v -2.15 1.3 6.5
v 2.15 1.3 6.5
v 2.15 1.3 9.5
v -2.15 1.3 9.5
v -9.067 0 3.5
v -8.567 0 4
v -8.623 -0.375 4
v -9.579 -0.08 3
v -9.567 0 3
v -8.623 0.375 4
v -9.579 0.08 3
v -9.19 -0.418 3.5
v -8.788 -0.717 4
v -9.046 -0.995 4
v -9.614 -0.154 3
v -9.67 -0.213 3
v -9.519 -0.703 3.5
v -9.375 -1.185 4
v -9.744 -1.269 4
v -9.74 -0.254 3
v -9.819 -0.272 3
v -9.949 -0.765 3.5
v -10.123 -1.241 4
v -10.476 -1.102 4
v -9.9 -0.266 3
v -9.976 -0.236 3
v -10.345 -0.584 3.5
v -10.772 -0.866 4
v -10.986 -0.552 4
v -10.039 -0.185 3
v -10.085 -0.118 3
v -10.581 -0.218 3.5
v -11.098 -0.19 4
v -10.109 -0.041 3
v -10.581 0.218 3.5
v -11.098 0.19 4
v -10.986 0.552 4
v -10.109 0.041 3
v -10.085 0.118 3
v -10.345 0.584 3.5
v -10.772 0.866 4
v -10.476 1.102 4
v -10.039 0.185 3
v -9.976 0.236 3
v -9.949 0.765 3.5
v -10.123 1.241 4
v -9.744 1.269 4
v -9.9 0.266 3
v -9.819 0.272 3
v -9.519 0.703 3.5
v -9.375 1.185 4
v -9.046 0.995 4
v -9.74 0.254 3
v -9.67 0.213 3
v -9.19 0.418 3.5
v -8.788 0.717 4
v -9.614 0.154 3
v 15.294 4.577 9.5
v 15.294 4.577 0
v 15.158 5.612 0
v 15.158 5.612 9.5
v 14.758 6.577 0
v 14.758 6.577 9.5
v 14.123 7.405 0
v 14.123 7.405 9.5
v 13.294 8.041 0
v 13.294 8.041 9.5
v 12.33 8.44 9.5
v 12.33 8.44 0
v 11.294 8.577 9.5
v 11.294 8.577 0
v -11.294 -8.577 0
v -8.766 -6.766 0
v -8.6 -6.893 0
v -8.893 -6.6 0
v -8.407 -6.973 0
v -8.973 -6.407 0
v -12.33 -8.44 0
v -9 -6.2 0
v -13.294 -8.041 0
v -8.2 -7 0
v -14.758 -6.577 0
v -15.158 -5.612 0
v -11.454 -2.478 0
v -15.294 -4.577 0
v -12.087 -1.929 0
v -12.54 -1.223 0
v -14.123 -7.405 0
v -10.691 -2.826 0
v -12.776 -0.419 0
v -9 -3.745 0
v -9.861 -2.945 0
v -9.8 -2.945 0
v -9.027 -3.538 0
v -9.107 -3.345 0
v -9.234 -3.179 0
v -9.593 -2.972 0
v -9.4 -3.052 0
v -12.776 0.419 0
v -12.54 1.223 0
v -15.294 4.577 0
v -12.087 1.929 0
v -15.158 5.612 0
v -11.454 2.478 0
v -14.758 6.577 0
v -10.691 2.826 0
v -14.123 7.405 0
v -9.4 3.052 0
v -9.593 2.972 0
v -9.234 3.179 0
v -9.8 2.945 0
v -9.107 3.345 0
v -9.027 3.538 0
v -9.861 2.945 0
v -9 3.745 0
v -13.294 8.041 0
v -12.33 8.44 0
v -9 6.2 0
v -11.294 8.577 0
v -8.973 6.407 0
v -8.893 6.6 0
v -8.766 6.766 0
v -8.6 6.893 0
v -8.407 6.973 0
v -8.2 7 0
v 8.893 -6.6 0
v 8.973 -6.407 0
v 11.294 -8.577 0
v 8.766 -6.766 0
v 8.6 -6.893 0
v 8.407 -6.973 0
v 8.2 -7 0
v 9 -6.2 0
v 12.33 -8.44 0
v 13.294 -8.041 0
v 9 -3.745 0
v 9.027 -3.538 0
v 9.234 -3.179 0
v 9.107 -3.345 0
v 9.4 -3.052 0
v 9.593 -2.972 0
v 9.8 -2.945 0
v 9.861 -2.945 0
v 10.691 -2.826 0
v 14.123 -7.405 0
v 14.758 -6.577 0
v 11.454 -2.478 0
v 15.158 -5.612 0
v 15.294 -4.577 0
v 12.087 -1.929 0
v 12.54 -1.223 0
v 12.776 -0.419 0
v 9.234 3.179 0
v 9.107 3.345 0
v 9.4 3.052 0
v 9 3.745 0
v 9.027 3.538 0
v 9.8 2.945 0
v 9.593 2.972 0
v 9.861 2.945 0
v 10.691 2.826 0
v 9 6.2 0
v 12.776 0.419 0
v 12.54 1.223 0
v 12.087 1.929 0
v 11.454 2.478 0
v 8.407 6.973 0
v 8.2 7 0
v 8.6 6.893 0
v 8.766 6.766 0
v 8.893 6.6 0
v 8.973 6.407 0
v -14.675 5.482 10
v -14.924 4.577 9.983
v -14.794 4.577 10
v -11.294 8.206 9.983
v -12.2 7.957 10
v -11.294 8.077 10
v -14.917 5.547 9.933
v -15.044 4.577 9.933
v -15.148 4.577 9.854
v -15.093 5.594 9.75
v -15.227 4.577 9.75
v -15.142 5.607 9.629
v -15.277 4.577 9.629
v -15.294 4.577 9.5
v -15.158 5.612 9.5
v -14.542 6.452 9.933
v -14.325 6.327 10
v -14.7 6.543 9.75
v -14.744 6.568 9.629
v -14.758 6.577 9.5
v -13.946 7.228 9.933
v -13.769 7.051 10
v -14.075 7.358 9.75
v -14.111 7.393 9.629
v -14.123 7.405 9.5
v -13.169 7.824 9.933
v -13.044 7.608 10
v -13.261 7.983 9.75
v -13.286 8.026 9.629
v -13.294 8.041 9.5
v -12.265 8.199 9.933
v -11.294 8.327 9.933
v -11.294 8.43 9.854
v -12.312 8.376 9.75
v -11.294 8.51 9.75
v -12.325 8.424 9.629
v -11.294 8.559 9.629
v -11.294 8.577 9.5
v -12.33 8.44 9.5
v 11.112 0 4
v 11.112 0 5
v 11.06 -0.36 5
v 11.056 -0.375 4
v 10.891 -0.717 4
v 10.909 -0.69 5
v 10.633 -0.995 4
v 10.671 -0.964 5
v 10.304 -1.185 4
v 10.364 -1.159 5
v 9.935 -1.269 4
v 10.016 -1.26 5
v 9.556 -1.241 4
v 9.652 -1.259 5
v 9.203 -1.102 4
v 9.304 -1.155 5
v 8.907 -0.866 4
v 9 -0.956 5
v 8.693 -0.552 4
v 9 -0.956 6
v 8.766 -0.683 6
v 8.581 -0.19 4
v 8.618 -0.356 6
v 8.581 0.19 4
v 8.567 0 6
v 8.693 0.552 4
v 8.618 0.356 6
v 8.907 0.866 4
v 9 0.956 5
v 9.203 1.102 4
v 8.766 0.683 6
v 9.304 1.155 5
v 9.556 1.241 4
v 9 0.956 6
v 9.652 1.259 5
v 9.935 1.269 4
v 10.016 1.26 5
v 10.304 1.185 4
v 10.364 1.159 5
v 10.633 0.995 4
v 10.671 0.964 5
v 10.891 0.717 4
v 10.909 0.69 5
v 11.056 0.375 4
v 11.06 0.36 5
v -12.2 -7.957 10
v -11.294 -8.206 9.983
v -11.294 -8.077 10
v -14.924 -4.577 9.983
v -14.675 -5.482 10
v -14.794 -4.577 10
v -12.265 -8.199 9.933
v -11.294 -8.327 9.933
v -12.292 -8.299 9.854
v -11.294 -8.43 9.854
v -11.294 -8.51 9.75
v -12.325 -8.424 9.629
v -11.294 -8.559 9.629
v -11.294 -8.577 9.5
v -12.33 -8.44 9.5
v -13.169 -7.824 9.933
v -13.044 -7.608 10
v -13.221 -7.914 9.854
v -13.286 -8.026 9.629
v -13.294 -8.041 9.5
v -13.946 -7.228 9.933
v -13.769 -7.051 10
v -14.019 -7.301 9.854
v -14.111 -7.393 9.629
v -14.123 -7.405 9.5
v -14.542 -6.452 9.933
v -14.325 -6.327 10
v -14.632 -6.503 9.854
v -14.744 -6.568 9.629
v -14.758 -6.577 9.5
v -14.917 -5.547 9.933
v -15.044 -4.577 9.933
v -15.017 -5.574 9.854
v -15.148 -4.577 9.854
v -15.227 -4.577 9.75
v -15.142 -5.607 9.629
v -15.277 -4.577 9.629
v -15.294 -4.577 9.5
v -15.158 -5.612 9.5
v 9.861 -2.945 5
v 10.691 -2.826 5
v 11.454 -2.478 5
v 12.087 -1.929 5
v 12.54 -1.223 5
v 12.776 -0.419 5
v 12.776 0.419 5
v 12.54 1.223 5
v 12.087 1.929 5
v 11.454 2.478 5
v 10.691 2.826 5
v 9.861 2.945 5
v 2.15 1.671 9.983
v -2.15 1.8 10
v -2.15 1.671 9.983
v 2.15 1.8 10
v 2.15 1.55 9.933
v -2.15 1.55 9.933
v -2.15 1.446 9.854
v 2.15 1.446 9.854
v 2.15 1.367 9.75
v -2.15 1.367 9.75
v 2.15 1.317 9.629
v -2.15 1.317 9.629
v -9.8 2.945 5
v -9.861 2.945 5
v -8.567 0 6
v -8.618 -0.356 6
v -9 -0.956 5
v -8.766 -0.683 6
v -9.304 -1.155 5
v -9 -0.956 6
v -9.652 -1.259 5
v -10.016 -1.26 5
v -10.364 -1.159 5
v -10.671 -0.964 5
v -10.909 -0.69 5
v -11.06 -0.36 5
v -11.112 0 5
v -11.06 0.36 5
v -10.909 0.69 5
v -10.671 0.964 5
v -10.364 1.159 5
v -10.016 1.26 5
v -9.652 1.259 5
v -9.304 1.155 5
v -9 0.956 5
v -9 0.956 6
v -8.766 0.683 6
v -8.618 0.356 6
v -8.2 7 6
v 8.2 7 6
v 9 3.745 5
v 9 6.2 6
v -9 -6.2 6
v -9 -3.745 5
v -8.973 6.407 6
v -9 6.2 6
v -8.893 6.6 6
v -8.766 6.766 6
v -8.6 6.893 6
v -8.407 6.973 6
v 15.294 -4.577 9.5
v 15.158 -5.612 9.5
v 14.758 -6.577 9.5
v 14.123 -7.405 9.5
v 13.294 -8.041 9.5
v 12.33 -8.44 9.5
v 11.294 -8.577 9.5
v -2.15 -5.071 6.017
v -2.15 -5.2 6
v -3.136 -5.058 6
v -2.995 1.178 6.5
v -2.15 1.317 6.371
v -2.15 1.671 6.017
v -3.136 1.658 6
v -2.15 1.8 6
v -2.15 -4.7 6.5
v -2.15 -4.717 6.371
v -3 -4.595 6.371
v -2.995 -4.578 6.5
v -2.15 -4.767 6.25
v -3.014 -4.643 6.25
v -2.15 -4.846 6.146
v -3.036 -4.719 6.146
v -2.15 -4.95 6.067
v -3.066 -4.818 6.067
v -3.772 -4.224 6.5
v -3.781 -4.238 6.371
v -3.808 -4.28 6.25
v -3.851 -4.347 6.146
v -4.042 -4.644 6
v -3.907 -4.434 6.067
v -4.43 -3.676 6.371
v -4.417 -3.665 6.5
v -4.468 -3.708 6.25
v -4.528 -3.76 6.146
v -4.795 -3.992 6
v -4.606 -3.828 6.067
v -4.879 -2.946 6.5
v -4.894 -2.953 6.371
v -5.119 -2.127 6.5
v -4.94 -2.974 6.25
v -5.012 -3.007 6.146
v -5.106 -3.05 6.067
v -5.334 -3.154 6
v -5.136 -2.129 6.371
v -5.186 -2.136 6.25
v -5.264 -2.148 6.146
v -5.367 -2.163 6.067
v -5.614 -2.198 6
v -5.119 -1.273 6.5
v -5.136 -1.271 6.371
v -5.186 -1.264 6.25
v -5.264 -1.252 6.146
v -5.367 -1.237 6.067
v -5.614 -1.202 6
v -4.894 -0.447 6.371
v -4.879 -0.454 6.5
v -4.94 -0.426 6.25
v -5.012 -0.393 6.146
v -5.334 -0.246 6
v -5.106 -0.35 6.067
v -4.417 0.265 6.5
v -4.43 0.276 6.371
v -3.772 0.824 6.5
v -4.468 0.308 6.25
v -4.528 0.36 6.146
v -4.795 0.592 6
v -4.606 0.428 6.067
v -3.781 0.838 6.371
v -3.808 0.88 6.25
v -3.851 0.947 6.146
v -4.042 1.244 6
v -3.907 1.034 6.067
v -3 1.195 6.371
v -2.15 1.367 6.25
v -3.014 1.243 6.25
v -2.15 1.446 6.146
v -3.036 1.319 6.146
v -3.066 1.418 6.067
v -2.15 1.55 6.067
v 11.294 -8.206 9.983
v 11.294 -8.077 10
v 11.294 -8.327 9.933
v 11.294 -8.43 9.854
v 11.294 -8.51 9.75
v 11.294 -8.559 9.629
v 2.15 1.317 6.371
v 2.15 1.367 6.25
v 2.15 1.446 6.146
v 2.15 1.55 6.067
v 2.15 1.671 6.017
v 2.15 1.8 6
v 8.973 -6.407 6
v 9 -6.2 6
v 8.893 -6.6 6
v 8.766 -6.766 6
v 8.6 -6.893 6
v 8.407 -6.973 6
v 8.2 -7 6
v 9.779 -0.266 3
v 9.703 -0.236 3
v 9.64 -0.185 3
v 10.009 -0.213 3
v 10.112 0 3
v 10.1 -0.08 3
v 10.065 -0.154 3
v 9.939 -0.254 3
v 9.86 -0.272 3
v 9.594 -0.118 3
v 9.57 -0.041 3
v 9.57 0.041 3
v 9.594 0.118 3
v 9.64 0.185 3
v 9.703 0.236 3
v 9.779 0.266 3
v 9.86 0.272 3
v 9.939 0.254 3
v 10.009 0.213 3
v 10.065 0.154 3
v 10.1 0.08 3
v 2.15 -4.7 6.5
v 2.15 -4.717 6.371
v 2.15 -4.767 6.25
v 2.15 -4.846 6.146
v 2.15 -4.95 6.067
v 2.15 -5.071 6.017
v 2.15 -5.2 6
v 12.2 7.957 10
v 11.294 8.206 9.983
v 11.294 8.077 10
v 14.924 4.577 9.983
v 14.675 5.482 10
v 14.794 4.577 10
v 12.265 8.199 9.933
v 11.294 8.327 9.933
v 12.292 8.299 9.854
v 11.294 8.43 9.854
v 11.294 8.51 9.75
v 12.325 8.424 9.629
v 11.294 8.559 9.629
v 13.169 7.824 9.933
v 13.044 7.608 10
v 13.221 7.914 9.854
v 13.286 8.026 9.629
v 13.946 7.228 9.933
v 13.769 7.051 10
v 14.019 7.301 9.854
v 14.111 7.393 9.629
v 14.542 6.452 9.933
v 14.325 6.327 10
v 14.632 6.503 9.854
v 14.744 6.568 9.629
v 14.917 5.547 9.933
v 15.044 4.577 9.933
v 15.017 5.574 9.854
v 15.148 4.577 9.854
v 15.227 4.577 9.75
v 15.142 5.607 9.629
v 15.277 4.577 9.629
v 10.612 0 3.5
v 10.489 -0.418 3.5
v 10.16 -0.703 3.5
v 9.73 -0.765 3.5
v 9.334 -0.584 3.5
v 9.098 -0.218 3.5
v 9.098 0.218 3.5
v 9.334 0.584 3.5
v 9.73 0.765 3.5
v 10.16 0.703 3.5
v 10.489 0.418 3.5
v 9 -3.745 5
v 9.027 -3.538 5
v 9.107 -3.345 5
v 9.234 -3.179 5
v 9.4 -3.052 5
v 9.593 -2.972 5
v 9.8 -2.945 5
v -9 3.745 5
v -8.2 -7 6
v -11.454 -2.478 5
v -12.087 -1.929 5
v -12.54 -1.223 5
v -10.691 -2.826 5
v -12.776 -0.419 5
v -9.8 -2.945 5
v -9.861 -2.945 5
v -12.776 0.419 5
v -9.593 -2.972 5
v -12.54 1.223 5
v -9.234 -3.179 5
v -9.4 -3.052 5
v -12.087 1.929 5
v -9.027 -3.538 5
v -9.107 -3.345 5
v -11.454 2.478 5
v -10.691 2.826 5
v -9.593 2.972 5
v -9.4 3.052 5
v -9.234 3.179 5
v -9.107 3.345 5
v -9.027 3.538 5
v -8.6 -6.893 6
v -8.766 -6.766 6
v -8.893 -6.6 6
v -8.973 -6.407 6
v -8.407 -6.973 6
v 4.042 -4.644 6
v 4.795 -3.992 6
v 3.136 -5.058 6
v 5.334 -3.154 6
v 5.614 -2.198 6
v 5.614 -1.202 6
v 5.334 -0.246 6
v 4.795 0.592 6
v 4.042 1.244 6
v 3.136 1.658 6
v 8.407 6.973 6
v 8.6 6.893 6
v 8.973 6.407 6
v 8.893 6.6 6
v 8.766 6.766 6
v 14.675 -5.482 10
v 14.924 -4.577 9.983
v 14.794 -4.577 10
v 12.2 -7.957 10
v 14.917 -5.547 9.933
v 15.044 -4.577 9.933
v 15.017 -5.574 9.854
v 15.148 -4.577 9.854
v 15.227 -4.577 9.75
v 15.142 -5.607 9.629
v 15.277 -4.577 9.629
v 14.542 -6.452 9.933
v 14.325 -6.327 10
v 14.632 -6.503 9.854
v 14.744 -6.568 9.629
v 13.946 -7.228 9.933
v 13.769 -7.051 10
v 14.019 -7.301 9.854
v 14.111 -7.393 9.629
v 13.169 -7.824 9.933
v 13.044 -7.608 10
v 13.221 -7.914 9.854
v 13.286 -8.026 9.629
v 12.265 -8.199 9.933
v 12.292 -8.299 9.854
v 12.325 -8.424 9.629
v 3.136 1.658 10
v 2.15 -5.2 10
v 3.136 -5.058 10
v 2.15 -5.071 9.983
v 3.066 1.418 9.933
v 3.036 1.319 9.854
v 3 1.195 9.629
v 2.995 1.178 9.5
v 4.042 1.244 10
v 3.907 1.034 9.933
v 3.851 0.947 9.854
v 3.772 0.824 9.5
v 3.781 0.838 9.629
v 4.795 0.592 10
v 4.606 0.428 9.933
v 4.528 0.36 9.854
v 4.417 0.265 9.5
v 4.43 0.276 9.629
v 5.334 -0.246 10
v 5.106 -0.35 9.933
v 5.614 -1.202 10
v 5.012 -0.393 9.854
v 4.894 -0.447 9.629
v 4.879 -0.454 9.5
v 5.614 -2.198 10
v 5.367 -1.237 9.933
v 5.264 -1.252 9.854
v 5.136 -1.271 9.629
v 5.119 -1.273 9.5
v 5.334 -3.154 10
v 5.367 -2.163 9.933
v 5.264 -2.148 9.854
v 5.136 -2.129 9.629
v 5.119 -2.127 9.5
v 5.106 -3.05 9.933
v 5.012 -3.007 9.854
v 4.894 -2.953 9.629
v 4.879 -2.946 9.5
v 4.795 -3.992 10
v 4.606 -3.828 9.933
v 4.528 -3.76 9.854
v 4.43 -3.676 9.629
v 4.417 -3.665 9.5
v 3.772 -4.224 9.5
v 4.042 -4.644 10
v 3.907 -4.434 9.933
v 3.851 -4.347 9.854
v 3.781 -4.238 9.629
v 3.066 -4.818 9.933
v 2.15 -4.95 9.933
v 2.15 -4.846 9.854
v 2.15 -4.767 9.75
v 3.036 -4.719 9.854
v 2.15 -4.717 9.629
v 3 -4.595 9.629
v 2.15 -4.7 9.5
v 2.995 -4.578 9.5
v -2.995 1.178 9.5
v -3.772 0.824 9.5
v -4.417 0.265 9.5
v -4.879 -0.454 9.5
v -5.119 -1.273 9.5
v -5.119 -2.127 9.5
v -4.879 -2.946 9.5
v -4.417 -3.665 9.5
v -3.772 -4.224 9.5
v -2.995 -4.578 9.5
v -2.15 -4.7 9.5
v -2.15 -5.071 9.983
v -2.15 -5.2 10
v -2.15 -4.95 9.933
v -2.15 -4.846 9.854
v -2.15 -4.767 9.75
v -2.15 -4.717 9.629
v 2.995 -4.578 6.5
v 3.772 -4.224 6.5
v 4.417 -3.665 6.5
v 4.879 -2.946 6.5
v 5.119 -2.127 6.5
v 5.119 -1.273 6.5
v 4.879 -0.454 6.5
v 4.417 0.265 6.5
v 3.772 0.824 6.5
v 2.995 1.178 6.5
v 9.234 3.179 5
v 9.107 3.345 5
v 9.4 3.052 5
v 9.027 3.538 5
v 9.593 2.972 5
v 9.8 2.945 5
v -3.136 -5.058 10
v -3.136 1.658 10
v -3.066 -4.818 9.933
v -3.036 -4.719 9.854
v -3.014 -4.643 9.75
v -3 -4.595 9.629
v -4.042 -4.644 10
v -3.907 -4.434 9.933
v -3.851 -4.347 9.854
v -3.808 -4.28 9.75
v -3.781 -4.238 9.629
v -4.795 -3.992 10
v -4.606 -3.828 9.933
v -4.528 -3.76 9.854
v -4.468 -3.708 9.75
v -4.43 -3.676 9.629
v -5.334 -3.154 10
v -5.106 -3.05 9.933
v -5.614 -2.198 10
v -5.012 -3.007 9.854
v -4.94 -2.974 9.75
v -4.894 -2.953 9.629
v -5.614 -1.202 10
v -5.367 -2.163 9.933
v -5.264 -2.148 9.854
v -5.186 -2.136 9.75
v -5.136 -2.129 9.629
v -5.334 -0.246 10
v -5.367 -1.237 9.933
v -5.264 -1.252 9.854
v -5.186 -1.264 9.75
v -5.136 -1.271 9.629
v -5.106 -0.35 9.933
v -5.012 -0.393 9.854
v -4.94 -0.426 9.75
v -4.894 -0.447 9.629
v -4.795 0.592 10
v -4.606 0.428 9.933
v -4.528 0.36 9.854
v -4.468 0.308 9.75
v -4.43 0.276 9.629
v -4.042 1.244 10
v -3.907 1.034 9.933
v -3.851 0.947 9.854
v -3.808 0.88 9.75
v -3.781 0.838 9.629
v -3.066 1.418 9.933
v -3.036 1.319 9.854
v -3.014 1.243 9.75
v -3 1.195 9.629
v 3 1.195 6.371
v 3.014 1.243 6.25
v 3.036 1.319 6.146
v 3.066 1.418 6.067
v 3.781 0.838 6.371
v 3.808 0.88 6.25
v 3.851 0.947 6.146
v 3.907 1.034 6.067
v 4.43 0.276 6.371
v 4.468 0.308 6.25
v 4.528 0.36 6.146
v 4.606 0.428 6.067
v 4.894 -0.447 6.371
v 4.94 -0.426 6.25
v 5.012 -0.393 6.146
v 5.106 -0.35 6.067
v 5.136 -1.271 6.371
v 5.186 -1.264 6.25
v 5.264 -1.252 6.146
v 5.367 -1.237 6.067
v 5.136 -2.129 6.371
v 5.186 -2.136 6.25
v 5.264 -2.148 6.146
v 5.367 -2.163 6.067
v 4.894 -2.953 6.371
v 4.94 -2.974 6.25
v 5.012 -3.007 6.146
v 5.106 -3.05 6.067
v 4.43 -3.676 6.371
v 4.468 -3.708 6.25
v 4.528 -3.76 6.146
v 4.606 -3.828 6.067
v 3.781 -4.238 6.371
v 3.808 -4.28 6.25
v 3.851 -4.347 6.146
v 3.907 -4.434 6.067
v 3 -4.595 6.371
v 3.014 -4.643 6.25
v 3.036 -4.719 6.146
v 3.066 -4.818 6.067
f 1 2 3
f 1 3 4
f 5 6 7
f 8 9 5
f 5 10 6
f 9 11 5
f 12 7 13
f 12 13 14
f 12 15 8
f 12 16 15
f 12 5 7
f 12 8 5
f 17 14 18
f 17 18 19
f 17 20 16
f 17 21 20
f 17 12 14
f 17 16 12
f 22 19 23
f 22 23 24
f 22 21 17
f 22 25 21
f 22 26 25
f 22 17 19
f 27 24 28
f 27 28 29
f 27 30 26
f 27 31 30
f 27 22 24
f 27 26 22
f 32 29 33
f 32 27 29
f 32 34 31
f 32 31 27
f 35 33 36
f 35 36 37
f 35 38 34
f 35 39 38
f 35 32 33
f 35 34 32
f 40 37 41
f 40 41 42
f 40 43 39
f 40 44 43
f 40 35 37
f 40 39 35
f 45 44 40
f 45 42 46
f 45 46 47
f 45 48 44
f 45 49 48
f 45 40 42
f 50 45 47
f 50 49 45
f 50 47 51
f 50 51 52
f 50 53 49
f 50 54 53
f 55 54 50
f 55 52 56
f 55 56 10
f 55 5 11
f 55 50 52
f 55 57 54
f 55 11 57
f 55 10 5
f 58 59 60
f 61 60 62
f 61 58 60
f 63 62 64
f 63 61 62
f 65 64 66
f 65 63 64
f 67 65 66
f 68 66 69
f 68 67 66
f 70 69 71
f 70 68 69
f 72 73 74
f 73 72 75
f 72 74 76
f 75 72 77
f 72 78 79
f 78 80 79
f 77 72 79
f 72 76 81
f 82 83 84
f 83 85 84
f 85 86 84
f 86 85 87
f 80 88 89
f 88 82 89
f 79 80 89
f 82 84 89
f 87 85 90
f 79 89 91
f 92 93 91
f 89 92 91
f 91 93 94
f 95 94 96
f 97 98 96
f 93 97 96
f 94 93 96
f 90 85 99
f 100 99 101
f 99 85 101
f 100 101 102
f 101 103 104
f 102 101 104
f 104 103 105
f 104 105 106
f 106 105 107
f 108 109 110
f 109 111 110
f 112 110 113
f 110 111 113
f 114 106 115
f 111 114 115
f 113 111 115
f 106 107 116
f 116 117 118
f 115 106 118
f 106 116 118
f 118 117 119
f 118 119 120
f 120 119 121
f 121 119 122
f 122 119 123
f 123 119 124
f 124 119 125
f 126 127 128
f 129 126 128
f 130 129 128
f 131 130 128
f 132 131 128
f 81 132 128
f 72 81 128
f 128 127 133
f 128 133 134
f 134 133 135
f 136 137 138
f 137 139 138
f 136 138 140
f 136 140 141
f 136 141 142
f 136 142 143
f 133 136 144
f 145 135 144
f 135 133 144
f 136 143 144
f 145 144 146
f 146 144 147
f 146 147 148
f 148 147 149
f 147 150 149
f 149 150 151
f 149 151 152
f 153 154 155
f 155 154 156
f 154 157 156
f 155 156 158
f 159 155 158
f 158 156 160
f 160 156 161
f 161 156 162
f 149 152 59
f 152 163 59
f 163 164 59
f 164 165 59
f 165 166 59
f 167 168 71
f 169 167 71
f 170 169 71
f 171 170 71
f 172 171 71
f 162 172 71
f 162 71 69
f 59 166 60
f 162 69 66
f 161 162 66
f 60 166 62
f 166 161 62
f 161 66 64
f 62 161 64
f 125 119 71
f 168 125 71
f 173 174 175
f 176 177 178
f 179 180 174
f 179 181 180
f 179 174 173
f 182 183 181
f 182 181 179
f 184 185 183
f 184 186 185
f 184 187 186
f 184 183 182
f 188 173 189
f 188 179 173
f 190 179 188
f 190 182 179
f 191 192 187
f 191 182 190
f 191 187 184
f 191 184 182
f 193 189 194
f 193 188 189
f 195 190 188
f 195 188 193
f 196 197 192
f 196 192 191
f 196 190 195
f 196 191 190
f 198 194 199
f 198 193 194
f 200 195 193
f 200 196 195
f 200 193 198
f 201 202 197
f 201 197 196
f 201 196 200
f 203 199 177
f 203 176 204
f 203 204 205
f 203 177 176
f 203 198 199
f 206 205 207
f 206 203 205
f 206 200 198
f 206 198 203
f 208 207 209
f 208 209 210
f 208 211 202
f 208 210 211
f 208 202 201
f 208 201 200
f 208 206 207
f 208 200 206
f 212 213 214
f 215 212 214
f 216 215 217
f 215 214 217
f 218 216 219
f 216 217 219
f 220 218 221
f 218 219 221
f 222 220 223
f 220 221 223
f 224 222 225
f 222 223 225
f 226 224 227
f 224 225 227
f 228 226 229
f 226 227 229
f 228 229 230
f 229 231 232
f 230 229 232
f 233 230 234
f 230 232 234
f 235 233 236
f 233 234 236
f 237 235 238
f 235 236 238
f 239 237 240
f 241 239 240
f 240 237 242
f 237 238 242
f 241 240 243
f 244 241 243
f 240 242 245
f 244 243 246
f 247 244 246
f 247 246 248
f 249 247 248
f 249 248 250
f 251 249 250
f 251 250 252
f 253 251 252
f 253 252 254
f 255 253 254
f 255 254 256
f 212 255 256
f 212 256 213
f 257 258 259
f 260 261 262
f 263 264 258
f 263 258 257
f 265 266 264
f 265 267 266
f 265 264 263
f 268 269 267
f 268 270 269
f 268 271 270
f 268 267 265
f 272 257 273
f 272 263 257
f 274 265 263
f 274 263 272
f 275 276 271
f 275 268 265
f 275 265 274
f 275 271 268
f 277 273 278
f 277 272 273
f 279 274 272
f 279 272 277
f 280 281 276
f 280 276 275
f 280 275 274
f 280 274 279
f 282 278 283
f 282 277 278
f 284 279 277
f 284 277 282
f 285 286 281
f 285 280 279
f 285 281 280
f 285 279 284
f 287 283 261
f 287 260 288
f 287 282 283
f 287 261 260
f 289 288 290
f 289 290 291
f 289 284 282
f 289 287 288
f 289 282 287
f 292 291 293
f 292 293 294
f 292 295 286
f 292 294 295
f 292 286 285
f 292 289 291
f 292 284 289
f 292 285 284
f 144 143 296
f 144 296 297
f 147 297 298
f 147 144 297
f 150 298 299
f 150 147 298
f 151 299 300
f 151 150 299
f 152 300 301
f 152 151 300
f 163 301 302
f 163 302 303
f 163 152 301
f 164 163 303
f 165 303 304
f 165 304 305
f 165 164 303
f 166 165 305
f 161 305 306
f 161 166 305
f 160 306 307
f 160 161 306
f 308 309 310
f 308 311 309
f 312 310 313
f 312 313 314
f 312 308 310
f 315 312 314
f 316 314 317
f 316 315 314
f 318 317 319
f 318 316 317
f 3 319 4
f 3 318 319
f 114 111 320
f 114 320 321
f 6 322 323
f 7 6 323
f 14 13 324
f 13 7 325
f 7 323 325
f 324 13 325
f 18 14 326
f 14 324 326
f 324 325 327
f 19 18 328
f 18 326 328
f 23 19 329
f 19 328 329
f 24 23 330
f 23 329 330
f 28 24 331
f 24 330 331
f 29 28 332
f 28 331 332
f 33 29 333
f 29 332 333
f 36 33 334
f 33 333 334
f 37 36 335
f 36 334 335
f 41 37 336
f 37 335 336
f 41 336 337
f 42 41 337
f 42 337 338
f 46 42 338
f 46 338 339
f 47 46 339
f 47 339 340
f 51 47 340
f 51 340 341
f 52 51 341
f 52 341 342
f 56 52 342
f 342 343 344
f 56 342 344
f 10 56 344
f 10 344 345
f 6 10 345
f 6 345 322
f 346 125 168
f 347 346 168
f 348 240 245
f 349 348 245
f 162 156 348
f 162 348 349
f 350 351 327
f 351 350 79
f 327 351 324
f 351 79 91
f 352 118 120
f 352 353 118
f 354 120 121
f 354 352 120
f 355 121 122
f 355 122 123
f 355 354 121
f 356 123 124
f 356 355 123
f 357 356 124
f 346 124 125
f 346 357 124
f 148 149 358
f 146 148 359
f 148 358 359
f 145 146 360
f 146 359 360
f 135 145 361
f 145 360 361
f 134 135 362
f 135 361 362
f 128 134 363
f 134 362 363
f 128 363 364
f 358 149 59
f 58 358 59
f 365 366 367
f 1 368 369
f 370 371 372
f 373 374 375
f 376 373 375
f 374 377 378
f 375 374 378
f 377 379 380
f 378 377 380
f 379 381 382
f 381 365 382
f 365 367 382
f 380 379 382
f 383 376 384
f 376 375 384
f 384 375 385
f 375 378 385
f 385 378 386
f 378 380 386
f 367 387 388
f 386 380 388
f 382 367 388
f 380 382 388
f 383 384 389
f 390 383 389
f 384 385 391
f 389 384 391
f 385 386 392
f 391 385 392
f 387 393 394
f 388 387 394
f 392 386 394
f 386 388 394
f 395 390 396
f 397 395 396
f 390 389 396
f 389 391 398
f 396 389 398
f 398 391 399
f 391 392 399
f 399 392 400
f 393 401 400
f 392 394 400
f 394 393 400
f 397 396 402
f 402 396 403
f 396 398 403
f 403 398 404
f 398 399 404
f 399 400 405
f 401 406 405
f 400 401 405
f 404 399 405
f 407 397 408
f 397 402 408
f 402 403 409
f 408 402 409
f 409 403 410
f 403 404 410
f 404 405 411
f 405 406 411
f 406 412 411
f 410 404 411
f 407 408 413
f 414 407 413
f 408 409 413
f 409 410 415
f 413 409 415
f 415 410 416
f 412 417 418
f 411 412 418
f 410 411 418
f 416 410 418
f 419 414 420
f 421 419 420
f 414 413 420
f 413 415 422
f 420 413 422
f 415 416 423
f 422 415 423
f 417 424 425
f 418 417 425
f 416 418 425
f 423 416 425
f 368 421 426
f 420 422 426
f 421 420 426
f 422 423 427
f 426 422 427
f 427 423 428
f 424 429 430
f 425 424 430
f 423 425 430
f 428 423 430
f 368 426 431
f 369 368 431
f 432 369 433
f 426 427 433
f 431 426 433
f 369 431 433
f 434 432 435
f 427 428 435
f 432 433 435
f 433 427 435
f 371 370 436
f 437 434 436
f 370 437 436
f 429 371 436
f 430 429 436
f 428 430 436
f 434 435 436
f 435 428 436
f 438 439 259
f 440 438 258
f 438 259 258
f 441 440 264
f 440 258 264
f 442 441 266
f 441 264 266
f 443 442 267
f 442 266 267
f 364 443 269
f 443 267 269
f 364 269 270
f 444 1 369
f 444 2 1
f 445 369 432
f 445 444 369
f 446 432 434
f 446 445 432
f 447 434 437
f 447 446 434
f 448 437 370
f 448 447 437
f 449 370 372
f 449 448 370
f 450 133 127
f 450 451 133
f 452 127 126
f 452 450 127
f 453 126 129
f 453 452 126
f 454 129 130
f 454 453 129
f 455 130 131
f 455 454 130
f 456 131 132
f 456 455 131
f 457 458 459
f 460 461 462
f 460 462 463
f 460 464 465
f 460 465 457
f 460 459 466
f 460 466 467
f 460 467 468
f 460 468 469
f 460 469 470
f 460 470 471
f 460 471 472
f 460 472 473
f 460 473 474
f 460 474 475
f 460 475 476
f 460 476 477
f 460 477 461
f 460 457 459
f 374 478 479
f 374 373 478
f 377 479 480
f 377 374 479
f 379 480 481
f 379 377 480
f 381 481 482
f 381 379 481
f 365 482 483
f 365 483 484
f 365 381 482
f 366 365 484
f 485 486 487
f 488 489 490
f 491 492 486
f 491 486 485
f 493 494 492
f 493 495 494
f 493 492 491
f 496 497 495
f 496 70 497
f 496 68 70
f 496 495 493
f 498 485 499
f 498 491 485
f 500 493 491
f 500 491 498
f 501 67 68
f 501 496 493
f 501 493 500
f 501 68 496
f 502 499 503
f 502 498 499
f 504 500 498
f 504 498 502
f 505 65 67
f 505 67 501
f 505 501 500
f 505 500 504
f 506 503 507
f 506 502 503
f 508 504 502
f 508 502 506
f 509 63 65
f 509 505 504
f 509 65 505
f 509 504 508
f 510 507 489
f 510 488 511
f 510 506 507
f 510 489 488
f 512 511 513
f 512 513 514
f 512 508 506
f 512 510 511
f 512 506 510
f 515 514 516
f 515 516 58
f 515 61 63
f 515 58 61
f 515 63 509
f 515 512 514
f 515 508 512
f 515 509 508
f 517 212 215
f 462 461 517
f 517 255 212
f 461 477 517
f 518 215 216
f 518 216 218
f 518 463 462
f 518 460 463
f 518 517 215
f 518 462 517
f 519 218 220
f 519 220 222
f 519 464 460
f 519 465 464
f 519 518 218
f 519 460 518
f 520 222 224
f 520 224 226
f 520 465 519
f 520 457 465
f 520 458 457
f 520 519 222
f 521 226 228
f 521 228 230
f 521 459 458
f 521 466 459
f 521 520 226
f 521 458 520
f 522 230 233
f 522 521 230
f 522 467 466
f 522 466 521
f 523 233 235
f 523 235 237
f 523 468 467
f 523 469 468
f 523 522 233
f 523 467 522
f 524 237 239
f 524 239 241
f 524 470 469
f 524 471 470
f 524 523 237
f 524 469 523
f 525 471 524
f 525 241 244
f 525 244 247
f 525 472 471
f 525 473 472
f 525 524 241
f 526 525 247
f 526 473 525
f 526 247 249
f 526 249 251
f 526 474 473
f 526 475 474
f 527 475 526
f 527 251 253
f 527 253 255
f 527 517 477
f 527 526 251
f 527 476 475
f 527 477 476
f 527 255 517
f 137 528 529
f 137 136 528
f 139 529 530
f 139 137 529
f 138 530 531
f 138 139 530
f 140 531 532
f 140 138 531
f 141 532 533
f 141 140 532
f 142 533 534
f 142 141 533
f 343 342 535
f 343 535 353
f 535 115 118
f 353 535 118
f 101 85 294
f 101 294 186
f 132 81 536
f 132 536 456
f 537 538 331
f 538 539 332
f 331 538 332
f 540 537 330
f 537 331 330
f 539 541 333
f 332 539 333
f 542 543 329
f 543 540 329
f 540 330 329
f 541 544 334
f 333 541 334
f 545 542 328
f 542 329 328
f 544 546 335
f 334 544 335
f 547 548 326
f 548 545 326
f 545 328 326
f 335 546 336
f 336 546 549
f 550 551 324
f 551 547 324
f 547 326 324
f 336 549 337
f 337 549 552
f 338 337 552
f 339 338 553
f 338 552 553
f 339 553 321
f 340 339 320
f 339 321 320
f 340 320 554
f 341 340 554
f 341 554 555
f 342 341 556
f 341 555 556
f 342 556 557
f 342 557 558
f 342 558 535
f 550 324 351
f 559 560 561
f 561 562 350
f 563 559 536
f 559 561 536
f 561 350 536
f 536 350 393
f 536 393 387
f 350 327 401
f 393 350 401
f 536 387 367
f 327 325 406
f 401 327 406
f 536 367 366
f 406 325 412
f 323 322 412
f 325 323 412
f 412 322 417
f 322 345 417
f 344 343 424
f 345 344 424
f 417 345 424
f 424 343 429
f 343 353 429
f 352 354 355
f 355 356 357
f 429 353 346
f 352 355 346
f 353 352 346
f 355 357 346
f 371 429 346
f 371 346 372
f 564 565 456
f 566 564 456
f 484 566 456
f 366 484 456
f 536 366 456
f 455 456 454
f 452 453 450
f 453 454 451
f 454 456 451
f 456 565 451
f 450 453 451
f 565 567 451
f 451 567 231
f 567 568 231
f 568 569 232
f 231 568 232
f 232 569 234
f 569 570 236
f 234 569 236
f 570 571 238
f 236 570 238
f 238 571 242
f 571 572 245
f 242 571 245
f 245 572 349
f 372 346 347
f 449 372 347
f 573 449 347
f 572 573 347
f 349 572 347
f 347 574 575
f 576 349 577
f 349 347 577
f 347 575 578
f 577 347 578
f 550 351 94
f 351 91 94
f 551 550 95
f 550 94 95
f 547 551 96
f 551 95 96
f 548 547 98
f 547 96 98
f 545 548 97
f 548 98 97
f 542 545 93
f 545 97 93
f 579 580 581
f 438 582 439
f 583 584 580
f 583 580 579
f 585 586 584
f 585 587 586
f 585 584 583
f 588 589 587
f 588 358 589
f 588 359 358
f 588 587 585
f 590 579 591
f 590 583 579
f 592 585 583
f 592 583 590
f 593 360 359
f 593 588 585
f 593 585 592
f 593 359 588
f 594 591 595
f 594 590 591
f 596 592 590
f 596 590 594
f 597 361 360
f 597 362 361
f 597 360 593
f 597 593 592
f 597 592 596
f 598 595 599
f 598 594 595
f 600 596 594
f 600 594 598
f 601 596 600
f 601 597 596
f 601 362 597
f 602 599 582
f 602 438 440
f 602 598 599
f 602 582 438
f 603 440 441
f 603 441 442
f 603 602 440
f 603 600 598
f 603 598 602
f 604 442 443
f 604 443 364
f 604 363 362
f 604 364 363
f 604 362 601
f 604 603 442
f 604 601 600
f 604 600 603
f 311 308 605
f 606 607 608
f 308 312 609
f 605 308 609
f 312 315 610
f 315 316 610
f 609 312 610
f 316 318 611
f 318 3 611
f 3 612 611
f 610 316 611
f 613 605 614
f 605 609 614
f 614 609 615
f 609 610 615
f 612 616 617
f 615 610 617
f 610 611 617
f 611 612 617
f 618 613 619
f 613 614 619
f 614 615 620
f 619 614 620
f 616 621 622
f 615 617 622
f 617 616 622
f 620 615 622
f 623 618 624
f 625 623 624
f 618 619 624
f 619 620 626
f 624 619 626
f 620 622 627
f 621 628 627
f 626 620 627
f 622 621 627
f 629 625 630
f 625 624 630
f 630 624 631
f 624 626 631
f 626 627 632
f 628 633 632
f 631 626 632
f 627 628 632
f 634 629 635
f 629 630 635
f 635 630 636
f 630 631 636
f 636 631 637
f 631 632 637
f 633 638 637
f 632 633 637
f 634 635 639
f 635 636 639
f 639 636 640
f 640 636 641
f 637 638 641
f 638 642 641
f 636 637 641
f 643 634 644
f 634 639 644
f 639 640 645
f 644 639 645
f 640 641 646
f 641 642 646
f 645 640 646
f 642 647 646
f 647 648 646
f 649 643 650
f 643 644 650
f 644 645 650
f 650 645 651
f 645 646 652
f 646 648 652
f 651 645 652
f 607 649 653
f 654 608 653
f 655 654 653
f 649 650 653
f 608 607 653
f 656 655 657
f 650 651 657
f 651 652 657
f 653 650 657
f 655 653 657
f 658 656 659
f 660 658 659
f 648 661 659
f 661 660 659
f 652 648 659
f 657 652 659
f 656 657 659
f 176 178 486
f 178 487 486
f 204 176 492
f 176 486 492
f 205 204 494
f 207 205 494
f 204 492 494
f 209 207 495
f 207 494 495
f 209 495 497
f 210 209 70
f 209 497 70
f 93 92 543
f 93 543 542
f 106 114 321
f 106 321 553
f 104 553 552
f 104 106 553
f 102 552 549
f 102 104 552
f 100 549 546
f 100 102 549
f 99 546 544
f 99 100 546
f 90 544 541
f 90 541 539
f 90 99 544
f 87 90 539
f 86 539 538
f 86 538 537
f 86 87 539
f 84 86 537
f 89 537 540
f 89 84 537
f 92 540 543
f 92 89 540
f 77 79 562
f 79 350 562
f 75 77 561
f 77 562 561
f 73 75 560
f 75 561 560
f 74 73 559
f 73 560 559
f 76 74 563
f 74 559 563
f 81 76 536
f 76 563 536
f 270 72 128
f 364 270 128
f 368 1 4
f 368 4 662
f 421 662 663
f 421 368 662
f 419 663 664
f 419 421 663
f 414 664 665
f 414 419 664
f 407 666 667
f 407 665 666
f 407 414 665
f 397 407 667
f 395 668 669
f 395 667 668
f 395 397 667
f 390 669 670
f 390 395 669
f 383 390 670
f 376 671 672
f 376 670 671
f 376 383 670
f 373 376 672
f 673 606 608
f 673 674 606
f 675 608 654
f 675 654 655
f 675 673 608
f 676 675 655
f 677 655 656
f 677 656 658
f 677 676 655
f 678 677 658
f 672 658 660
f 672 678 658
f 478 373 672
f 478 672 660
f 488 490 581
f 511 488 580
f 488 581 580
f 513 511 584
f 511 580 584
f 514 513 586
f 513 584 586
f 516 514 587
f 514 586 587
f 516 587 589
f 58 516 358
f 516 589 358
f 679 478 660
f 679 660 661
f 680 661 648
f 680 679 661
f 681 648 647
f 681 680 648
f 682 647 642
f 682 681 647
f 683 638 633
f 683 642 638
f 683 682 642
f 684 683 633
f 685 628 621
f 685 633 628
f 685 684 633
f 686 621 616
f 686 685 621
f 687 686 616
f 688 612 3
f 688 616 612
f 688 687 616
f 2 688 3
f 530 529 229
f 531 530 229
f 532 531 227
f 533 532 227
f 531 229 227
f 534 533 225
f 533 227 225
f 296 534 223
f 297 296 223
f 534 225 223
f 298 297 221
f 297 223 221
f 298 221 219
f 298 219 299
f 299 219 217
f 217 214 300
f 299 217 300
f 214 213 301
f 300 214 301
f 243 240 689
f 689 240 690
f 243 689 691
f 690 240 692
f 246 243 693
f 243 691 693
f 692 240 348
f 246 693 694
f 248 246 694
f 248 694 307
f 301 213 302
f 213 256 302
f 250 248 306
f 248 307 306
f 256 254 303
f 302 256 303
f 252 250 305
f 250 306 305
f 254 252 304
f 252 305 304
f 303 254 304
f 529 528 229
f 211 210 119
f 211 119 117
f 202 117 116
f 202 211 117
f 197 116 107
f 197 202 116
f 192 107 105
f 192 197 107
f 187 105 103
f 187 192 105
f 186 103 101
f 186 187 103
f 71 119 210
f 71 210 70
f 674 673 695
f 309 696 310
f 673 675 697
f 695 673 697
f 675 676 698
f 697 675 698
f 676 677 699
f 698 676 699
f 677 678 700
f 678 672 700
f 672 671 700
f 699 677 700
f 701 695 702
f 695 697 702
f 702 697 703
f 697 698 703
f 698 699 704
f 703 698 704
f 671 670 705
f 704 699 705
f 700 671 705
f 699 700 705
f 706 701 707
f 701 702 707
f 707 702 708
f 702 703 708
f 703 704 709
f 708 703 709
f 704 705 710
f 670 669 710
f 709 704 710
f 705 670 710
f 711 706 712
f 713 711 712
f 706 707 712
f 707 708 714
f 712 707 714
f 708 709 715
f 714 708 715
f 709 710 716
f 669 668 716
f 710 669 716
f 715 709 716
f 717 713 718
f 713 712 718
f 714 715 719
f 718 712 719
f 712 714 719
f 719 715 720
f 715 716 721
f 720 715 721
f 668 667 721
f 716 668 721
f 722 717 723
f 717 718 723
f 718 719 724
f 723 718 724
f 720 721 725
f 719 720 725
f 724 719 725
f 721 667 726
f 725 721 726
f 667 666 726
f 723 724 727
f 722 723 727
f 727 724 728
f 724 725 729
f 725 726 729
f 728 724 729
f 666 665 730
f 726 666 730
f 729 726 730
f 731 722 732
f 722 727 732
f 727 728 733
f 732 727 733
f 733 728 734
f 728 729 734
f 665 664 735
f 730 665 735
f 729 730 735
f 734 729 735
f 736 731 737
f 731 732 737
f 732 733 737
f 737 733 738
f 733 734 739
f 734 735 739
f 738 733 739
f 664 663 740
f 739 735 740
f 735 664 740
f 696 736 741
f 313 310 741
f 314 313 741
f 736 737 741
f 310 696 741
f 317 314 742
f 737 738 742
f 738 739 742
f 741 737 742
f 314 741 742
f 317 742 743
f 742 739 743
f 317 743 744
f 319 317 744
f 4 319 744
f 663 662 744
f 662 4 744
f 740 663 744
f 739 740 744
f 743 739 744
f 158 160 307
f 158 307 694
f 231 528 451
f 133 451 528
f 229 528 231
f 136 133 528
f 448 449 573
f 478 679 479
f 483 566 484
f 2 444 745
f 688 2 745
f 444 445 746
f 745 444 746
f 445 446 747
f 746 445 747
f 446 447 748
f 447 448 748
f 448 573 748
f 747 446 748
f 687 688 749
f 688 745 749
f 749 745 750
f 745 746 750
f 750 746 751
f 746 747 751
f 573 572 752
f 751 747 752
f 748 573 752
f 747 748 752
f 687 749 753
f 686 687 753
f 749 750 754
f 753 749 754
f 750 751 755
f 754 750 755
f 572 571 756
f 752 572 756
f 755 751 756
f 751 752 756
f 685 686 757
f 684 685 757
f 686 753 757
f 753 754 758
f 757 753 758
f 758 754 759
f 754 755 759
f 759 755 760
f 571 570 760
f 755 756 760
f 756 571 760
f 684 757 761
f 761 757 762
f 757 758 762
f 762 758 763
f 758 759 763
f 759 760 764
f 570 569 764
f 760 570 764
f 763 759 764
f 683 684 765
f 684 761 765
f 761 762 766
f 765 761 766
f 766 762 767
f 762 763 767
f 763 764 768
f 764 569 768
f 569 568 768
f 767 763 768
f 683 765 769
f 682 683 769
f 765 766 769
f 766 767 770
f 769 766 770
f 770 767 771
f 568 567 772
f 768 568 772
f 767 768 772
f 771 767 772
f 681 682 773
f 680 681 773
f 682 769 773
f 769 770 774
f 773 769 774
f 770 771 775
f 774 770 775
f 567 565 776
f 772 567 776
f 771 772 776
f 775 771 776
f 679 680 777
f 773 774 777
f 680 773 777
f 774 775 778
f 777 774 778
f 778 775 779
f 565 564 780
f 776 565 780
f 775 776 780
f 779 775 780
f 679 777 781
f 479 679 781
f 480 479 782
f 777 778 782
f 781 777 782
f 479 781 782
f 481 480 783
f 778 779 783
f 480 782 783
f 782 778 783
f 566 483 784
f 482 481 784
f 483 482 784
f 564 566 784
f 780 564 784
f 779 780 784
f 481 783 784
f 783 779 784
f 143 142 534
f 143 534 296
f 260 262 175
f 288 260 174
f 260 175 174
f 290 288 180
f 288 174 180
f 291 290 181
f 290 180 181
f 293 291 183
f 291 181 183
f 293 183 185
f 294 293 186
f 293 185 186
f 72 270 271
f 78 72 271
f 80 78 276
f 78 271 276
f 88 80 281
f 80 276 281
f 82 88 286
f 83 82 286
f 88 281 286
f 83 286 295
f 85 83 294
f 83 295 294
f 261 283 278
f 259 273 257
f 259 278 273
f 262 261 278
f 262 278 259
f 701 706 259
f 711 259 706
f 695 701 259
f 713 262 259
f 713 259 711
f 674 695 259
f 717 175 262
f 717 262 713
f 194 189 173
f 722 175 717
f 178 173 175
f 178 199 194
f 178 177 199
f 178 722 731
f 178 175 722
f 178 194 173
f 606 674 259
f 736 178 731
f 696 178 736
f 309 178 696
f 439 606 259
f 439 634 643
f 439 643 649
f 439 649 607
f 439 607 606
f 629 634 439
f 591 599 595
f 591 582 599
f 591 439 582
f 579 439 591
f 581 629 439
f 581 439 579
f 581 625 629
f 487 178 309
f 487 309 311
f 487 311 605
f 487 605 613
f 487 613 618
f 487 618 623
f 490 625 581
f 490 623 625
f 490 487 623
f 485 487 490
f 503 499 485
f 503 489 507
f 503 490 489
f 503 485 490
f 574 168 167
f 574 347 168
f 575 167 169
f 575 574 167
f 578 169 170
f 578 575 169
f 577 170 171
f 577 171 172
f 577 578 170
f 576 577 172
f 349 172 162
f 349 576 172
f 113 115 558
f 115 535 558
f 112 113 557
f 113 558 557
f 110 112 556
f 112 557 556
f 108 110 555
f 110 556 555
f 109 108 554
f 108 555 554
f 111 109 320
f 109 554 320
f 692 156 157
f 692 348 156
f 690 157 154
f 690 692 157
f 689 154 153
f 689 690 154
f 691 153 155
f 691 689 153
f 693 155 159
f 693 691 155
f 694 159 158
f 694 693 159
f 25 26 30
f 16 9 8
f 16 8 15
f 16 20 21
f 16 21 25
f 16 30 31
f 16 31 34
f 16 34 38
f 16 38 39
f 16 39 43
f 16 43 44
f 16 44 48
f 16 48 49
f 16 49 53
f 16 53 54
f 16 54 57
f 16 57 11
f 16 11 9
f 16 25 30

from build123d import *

# Parameters (mm, degrees)
SKETCH041_W     = 30.588764
SKETCH041_H     = 17.153068
PAD012_DEPTH    = 10
SKETCH042_W     = 18
SKETCH042_H     = 14
POCKET033_DEPTH = 6
POCKET034_DEPTH = 5
POCKET035_DEPTH = 10.001
SKETCH045_R     = 1.272634
PAD013_DEPTH    = 3
CHAMFER011_SIZE = 1
FILLET033_R     = 0.8
FILLET034_R     = 4
FILLET035_R     = 0.5


with BuildPart() as part:
    # Sketch041 → Pad012 (new body)
    with BuildSketch(Plane.XY):
        Rectangle(SKETCH041_W, SKETCH041_H)
    extrude(amount=PAD012_DEPTH)

    # Sketch042 → Pocket033 (cut)
    with BuildSketch(Plane.XY):
        Rectangle(SKETCH042_W, SKETCH042_H)
    extrude(amount=POCKET033_DEPTH, mode=Mode.SUBTRACT)

    # Sketch043 → Pocket034 (cut)
    with BuildSketch(Plane.XY):
        with BuildLine():
            ThreePointArc((-9.861316, 2.945018), (-12.806334, 0), (-9.861316, -2.945018))
            Line((-9.861316, -2.945018), (9.861316, -2.945018))
            ThreePointArc((9.861316, -2.945018), (12.806334, 0), (9.861316, 2.945018))
            Line((9.861316, 2.945018), (-9.861316, 2.945018))
        make_face()
    extrude(amount=POCKET034_DEPTH, mode=Mode.SUBTRACT)

    # Sketch044 → Pocket035 (cut, through all)
    with BuildSketch(Plane.XY):
        with BuildLine():
            ThreePointArc((-2.15, 1.3), (-5.15, -1.7), (-2.15, -4.7))
            Line((-2.15, -4.7), (2.15, -4.7))
            ThreePointArc((2.15, -4.7), (5.15, -1.7), (2.15, 1.3))
            Line((2.15, 1.3), (-2.15, 1.3))
        make_face()
    extrude(amount=POCKET035_DEPTH, mode=Mode.SUBTRACT)

    # Sketch045 (on Face21 of Pocket035) → Pad013 (join)
    with BuildSketch(Plane(origin=(0, 0, 6), x_dir=(1, 0, 0), z_dir=(0, 0, -1))):
        with Locations((-9.839489, 0)):
            Circle(SKETCH045_R)
        with Locations((9.839489, 0)):
            Circle(SKETCH045_R)
    extrude(amount=PAD013_DEPTH)

    # Chamfer011
    chamfer011_edges = [part.edges().sort_by_distance(p)[0] for p in [
        (8.566855, 0, 3),
        (-11.112123, 0, 3),
    ]]
    chamfer(chamfer011_edges, length=CHAMFER011_SIZE)

    # Fillet033
    fillet033_edges = [part.edges().sort_by_distance(p)[0] for p in [
        (9, 2.945018, 2.5),
        (9, -2.945018, 2.5),
        (9, 7, 3),
        (-9, 2.945018, 2.5),
        (-9, -2.945018, 2.5),
        (-9, -7, 3),
        (9, -7, 3),
        (-9, 7, 3),
    ]]
    fillet(fillet033_edges, radius=FILLET033_R)

    # Fillet034
    fillet034_edges = [part.edges().sort_by_distance(p)[0] for p in [
        (-15.294382, -8.576534, 5),
        (-15.294382, 8.576534, 5),
        (15.294382, 8.576534, 5),
        (15.294382, -8.576534, 5),
    ]]
    fillet(fillet034_edges, radius=FILLET034_R)

    # Fillet035
    fillet035_edges = [part.edges().sort_by_distance(p)[0] for p in [
        (0, 8.576534, 10),
        (-14.12281, 7.404962, 10),
        (14.12281, 7.404962, 10),
        (-15.294382, 0, 10),
        (15.294382, 0, 10),
        (-14.12281, -7.404962, 10),
        (14.12281, -7.404962, 10),
        (0, -8.576534, 10),
        (0, -4.7, 10),
        (5.15, -1.7, 10),
        (0, 1.3, 10),
        (-5.15, -1.7, 10),
        (-5.15, -1.7, 6),
    ]]
    fillet(fillet035_edges, radius=FILLET035_R)


solid = part.part
